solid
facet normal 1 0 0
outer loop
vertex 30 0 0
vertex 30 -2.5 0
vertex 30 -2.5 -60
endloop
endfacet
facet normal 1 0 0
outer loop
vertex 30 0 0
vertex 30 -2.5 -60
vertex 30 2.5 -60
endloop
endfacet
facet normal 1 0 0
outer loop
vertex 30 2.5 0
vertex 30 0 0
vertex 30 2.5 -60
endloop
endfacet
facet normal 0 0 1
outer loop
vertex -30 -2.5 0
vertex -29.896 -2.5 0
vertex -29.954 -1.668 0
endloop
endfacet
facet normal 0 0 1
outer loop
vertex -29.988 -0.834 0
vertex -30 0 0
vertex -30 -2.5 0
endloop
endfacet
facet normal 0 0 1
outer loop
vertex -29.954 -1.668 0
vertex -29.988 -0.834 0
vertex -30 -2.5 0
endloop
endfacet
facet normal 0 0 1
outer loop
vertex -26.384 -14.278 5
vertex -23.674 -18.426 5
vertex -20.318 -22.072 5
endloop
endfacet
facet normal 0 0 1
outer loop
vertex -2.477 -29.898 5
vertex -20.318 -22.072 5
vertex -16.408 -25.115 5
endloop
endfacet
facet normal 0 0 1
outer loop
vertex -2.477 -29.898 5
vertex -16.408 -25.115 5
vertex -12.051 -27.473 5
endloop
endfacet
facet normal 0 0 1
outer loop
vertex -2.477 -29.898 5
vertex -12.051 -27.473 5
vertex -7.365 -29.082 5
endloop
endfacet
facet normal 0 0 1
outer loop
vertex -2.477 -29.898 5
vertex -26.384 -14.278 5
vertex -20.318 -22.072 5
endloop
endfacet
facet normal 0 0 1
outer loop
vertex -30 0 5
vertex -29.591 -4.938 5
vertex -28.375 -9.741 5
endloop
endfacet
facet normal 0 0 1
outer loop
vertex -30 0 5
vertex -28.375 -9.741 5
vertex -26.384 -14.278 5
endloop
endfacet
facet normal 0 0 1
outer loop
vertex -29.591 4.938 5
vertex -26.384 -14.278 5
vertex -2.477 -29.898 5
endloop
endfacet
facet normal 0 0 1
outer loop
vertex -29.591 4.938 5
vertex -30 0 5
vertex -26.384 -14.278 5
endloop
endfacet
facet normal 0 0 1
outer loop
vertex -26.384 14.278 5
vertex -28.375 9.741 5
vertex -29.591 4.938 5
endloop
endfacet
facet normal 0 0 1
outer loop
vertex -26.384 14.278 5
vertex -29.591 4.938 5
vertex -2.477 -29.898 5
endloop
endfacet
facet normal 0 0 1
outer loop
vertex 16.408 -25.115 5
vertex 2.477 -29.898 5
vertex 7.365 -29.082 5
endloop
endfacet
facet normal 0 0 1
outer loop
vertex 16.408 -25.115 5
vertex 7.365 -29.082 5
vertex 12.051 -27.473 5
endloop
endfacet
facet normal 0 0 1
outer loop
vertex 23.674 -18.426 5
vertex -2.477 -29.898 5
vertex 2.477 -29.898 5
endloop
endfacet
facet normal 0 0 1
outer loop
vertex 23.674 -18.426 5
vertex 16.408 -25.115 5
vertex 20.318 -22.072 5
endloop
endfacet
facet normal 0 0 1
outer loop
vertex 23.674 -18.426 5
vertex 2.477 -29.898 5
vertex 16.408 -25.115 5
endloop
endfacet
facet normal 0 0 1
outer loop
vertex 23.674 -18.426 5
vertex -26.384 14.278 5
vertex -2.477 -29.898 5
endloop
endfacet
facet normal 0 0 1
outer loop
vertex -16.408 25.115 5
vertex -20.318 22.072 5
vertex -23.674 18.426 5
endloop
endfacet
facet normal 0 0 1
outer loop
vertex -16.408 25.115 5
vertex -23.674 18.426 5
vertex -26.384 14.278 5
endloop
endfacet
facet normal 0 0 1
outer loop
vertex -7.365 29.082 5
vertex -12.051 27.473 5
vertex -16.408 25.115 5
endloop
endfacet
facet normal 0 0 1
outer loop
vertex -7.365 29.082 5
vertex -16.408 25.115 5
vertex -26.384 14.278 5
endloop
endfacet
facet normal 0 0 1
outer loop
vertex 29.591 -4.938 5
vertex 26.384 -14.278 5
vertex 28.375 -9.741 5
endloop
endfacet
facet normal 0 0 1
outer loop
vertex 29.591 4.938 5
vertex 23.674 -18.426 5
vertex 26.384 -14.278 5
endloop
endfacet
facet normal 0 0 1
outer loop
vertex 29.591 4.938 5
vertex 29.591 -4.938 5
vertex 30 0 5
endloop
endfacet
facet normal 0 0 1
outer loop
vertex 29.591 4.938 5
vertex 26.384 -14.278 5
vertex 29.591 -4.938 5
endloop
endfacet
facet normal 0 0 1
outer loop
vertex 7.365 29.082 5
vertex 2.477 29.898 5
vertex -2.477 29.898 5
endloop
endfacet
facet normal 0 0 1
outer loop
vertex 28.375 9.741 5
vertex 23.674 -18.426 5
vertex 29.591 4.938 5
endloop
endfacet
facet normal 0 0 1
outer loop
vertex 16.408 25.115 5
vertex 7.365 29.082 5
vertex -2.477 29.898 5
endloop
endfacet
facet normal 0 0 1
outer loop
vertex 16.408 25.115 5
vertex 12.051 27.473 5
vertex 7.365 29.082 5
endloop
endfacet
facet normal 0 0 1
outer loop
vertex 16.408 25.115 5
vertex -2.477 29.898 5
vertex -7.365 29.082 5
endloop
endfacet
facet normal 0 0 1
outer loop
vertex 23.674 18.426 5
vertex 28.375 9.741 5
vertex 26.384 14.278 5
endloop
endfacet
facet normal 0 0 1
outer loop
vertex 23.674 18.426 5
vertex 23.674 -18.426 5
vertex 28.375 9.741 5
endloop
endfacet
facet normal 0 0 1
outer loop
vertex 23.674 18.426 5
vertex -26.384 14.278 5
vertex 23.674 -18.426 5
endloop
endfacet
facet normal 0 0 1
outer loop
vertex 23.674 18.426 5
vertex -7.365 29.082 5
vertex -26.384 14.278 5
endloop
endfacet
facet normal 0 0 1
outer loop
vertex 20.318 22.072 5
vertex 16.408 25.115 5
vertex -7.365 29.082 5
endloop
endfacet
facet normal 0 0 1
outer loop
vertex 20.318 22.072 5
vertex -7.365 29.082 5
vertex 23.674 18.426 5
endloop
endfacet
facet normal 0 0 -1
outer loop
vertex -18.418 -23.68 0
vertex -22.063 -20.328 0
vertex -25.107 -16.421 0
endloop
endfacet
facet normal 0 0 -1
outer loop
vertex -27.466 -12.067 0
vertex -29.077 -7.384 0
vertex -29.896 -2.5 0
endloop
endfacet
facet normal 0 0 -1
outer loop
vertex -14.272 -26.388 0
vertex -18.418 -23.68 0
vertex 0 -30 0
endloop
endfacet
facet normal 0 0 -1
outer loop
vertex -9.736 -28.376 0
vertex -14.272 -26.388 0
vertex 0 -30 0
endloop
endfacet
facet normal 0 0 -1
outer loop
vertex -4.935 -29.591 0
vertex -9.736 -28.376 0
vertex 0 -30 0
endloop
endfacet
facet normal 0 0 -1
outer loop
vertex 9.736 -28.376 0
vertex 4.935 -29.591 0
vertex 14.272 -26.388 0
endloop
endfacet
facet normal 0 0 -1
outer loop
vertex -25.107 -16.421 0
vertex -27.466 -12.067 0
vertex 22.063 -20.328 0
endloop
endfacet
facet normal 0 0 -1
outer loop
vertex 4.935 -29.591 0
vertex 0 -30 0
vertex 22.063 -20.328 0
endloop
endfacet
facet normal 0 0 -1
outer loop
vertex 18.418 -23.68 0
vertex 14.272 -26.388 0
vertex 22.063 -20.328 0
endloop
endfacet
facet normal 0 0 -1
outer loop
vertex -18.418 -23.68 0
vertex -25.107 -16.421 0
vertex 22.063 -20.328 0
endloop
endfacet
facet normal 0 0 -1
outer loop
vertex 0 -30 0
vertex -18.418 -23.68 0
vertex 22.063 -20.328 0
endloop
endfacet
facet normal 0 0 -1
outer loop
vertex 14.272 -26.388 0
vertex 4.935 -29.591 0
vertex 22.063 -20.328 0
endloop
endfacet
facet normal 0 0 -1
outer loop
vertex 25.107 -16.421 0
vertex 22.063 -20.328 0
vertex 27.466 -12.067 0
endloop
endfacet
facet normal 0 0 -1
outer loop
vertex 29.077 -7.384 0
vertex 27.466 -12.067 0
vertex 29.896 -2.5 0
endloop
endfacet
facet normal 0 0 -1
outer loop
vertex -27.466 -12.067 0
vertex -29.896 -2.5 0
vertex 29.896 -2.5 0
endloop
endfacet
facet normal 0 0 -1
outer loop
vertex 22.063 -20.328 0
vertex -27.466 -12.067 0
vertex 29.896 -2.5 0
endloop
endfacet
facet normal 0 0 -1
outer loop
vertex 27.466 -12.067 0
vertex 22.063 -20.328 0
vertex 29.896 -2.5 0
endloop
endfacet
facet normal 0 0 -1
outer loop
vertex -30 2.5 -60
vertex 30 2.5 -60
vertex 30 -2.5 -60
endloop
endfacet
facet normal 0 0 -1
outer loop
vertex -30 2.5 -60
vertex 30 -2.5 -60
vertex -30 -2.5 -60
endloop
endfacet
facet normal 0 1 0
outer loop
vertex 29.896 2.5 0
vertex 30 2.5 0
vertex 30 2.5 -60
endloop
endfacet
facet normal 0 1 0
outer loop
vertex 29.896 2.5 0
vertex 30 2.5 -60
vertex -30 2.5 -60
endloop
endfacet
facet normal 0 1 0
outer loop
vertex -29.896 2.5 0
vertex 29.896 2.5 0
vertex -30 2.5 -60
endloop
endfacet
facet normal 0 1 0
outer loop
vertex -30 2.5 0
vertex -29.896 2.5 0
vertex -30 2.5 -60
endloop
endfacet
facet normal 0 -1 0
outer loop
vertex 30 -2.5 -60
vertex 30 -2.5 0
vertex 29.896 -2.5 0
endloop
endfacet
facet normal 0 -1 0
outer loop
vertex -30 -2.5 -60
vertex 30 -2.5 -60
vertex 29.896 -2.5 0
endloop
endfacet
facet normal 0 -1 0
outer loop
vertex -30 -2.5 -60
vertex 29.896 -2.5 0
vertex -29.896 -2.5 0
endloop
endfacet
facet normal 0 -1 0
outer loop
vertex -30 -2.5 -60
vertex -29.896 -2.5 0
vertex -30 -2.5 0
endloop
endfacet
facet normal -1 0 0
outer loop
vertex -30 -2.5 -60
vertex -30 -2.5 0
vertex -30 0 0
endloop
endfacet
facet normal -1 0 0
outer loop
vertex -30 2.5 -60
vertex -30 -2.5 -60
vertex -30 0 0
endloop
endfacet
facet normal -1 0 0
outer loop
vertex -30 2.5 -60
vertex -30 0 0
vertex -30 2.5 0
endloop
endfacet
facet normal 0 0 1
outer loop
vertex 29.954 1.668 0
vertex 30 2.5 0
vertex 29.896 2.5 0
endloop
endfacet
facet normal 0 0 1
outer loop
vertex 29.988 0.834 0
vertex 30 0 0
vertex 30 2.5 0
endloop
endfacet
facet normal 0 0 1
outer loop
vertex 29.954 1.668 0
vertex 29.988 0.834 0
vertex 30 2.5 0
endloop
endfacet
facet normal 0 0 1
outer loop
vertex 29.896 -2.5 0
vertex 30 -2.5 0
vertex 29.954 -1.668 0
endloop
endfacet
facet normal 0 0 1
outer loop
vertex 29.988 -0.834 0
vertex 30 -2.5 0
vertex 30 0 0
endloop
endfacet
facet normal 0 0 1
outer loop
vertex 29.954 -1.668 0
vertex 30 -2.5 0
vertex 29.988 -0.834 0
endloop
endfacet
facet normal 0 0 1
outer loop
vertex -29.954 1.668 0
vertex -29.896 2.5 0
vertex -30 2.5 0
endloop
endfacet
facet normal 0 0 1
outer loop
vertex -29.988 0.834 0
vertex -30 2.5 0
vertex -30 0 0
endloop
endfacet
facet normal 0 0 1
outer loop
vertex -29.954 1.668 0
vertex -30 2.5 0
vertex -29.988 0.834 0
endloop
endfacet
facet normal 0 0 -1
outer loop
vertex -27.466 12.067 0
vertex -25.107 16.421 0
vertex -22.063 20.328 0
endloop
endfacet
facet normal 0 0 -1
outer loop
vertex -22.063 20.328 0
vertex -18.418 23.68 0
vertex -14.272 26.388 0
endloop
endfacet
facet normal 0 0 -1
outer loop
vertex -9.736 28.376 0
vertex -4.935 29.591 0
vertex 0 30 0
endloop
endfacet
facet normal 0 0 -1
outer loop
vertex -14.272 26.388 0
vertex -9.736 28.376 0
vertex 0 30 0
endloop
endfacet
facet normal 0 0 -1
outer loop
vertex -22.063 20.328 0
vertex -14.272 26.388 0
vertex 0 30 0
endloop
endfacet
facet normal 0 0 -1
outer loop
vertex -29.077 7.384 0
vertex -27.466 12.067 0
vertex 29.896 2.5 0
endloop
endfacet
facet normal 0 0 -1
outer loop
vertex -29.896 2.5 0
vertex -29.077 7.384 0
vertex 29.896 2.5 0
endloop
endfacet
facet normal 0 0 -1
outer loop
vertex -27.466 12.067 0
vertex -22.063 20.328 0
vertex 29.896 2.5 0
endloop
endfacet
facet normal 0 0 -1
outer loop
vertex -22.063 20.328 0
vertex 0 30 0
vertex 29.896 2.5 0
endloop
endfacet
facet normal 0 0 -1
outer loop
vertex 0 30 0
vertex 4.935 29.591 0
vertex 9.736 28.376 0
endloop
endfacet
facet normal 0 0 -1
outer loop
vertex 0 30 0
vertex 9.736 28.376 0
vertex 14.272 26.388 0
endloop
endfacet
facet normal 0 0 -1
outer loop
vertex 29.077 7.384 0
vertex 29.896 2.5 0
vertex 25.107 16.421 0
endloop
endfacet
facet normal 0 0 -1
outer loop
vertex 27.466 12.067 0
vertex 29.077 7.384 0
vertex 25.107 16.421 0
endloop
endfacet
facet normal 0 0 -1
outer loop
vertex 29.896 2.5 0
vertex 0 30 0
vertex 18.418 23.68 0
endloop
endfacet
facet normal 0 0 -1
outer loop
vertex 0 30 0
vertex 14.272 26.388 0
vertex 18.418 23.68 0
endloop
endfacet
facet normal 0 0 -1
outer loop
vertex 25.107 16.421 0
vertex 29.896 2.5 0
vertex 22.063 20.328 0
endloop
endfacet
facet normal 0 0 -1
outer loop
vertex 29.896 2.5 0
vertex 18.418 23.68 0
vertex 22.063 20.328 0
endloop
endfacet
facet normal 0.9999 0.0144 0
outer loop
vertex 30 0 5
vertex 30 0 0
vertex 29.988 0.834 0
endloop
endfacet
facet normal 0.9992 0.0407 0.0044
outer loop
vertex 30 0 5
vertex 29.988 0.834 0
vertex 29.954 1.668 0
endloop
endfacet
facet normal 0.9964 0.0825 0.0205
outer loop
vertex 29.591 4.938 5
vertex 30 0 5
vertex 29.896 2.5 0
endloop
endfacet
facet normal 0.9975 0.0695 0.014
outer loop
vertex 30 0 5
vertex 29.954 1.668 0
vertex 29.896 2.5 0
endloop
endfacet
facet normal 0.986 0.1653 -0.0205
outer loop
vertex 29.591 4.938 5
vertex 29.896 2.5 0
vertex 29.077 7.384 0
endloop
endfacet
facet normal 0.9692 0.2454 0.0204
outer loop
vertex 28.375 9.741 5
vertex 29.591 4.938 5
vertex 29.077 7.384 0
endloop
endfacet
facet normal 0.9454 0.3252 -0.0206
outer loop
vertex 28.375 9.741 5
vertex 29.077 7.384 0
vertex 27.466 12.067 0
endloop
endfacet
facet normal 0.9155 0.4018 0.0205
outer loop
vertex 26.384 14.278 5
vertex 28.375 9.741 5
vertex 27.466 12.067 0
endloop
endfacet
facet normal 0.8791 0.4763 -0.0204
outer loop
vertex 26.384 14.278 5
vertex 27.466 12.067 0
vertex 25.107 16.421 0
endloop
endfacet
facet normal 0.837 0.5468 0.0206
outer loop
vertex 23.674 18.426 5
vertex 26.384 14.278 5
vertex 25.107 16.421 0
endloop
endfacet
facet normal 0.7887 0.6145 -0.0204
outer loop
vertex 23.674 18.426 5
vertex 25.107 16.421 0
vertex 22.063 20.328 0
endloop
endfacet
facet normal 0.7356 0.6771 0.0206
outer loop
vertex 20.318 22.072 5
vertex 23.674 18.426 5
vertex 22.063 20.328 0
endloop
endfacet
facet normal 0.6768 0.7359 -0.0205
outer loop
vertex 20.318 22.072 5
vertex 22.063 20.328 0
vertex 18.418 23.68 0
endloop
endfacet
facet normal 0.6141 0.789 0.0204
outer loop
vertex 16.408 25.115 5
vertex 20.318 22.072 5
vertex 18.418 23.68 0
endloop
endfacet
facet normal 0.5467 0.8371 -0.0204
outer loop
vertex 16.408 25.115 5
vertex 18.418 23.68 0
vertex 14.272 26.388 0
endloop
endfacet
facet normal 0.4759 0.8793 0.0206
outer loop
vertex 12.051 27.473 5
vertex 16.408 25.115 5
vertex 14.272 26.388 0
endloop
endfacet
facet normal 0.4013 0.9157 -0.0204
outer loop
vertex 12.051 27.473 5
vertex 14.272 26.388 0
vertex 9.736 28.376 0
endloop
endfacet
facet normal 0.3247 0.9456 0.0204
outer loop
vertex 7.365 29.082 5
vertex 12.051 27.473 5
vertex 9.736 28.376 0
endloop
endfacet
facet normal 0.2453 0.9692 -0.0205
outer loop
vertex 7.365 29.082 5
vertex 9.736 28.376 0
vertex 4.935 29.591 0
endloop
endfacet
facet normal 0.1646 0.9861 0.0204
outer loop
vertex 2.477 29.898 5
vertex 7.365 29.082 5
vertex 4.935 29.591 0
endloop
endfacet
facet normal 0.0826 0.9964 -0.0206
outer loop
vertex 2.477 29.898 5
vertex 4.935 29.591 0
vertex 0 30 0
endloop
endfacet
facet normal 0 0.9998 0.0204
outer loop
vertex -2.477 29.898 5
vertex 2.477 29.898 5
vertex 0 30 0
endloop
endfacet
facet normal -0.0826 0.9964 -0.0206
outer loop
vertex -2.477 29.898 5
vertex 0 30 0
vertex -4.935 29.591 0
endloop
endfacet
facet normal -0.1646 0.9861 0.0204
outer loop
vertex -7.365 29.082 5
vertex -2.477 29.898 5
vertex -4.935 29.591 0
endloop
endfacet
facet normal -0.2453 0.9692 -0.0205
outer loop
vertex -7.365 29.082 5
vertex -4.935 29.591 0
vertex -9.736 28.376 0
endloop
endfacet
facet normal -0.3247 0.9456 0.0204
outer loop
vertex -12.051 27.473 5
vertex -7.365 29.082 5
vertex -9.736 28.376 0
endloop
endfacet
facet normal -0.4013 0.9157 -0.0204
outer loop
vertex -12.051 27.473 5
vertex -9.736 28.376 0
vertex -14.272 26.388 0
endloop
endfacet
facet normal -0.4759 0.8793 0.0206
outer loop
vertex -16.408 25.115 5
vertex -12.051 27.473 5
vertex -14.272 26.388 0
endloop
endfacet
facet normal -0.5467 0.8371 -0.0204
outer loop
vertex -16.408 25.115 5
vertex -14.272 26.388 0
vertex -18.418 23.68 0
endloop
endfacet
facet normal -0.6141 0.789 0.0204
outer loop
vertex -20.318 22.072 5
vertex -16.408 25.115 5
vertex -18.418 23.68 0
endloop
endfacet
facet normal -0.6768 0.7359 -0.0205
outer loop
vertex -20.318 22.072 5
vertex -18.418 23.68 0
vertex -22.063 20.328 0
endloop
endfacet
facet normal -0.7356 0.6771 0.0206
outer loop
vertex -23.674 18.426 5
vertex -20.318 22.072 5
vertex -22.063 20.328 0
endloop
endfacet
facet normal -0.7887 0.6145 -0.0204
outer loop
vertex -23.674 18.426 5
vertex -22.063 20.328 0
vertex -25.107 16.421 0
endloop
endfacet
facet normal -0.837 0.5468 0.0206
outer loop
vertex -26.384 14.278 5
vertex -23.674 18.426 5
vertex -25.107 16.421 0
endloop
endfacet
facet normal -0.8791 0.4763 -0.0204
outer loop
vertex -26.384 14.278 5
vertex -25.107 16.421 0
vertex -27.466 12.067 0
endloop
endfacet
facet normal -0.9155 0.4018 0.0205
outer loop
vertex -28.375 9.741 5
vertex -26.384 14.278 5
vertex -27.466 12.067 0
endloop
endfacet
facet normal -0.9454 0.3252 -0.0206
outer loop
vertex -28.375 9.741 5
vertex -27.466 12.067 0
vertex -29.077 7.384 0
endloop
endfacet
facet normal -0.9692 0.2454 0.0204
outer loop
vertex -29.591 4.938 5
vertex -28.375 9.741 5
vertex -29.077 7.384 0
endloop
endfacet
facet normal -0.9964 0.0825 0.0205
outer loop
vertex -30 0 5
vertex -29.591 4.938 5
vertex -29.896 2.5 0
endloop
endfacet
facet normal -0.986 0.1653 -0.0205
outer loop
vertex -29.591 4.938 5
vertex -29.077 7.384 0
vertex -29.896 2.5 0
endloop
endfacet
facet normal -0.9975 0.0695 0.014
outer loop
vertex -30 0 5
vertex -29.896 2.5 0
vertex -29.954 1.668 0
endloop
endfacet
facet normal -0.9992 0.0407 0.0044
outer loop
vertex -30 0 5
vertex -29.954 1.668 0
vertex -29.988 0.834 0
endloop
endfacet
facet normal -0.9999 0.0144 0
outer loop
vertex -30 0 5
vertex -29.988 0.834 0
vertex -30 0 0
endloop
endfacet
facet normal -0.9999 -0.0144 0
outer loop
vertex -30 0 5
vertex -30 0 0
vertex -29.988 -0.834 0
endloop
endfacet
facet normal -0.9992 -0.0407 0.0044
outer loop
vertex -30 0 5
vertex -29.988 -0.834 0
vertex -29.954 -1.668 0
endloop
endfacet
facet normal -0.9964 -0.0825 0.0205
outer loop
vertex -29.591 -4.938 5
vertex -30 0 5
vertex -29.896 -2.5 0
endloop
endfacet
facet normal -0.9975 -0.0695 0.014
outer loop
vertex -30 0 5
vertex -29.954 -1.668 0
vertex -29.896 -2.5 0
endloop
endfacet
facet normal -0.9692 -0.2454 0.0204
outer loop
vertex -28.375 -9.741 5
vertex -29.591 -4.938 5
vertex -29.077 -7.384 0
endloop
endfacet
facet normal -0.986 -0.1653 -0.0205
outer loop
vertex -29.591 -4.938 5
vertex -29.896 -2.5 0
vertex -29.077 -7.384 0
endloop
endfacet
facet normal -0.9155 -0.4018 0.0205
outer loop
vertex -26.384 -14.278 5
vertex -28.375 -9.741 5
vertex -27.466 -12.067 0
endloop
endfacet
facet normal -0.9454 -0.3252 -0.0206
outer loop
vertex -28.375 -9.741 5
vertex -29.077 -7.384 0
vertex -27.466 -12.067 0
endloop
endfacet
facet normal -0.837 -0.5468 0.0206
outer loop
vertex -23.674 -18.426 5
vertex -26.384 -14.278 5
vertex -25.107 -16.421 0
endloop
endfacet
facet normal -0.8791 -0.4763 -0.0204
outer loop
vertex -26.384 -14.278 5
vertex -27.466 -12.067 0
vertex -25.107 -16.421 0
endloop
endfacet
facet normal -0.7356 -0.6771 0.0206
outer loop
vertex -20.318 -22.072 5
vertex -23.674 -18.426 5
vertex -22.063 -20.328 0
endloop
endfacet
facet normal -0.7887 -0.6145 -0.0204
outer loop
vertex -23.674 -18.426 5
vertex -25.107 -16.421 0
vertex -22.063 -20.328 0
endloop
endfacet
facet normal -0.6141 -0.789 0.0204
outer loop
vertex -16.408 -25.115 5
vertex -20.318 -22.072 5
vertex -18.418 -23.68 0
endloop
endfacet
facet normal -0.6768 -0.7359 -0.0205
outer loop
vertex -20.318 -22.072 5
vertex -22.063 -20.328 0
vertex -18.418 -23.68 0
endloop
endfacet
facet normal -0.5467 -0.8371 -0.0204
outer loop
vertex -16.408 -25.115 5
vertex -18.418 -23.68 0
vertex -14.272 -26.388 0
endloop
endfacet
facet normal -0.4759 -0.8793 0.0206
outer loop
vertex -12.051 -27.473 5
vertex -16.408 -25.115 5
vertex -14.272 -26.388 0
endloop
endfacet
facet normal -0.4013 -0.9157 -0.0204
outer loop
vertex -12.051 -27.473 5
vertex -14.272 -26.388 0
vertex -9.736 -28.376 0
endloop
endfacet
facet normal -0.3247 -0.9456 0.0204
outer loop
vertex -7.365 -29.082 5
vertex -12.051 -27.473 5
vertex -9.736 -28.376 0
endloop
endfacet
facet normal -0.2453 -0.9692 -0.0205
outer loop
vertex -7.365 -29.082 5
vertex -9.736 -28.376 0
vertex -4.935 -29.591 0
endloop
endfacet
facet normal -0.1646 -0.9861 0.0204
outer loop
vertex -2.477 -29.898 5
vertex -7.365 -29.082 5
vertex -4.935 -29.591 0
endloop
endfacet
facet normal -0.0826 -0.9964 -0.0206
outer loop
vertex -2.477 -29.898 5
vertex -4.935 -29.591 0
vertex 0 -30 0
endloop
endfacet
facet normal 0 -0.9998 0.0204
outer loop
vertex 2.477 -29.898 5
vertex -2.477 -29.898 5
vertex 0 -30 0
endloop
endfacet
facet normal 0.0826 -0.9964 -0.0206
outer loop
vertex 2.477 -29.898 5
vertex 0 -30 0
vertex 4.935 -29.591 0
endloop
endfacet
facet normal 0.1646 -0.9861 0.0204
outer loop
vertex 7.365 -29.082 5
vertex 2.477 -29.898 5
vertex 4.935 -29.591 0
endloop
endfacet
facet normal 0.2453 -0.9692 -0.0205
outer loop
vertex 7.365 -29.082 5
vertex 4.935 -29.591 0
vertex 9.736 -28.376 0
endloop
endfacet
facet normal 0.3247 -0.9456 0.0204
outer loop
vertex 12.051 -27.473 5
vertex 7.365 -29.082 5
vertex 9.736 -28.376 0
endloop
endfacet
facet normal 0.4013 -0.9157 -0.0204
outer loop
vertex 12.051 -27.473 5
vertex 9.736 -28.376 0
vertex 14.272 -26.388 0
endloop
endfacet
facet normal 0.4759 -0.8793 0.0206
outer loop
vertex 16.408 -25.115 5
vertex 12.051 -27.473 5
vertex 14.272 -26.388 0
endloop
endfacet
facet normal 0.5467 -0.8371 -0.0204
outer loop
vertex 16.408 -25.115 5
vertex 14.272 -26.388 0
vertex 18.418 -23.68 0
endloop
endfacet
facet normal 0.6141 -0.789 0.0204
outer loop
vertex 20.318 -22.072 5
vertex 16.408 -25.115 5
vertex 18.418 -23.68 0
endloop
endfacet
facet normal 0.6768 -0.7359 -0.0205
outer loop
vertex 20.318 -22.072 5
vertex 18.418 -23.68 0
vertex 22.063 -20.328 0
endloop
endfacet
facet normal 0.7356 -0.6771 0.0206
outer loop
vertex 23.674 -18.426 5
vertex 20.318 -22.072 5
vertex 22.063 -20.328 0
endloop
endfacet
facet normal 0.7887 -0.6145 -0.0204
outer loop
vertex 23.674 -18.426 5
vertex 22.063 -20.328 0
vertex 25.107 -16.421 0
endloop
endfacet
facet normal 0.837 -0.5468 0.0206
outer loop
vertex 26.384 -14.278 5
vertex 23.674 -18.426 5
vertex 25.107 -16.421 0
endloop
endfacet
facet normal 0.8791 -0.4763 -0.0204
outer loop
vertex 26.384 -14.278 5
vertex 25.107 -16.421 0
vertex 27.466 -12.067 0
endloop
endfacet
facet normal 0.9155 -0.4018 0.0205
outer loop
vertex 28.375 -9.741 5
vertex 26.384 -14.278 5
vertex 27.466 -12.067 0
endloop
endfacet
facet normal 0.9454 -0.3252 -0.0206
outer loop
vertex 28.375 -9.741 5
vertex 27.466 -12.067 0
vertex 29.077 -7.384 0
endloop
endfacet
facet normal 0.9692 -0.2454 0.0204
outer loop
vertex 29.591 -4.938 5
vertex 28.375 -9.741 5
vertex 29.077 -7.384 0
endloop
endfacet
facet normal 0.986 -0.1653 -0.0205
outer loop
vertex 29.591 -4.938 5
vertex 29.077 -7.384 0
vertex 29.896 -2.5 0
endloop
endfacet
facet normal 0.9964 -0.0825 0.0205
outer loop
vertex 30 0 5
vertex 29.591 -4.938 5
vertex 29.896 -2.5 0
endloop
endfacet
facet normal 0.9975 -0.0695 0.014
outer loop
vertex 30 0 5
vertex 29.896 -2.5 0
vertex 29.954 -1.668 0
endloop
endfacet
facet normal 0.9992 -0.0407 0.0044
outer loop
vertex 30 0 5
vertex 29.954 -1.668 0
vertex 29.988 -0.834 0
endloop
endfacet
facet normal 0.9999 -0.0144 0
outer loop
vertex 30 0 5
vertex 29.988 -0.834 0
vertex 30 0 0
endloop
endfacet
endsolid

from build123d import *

# Parameters (mm, degrees)
SKETCH_1_R          = 30
SKETCH_1_R_2        = 13.5
SKETCH_1_R_3        = 1.880556804
EXTRUDE_1_DEPTH     = 10
SKETCH_2_W          = 60
SKETCH_2_H          = 5
EXTRUDE_2_DEPTH     = 60
CUT_EXTRUDE_START   = -5
SKETCH_7_R          = 30
CUT_EXTRUDE_4_DEPTH = 5


with BuildPart() as part:
    # 草图1 → 凸台-拉伸1 (new body)
    # profile 1 of 5: a face of its own
    with BuildSketch(Plane.XY):
        Circle(SKETCH_1_R)
        Circle(SKETCH_1_R_2, mode=Mode.SUBTRACT)
    # profile 2 of 5: a face of its own
    with BuildSketch(Plane.XY):
        Circle(SKETCH_1_R_2)
    # profile 3 of 5: a face of its own
    with BuildSketch(Plane.XY):
        with Locations((0, 13.5)):
            Circle(SKETCH_1_R_3)
    # profile 4 of 5: a face of its own
    with BuildSketch(Plane.XY):
        with Locations((-11.691342951, -6.75)):
            Circle(SKETCH_1_R_3)
    # profile 5 of 5: a face of its own
    with BuildSketch(Plane.XY):
        with Locations((11.691342951, -6.75)):
            Circle(SKETCH_1_R_3)
    extrude(amount=EXTRUDE_1_DEPTH)

    # 草图2 → 凸台-拉伸2 (add)
    with BuildSketch(Plane(origin=(0, 0, 0), x_dir=(-1, 0, 0), z_dir=(0, 0, -1))):
        Rectangle(SKETCH_2_W, SKETCH_2_H)
    extrude(amount=EXTRUDE_2_DEPTH)

    # 草图7 → 切除-拉伸4 (cut)
    with BuildSketch(Plane.XY.offset(10).offset(CUT_EXTRUDE_START)):
        Circle(SKETCH_7_R)
    extrude(amount=CUT_EXTRUDE_4_DEPTH, mode=Mode.SUBTRACT)


solid = part.part
